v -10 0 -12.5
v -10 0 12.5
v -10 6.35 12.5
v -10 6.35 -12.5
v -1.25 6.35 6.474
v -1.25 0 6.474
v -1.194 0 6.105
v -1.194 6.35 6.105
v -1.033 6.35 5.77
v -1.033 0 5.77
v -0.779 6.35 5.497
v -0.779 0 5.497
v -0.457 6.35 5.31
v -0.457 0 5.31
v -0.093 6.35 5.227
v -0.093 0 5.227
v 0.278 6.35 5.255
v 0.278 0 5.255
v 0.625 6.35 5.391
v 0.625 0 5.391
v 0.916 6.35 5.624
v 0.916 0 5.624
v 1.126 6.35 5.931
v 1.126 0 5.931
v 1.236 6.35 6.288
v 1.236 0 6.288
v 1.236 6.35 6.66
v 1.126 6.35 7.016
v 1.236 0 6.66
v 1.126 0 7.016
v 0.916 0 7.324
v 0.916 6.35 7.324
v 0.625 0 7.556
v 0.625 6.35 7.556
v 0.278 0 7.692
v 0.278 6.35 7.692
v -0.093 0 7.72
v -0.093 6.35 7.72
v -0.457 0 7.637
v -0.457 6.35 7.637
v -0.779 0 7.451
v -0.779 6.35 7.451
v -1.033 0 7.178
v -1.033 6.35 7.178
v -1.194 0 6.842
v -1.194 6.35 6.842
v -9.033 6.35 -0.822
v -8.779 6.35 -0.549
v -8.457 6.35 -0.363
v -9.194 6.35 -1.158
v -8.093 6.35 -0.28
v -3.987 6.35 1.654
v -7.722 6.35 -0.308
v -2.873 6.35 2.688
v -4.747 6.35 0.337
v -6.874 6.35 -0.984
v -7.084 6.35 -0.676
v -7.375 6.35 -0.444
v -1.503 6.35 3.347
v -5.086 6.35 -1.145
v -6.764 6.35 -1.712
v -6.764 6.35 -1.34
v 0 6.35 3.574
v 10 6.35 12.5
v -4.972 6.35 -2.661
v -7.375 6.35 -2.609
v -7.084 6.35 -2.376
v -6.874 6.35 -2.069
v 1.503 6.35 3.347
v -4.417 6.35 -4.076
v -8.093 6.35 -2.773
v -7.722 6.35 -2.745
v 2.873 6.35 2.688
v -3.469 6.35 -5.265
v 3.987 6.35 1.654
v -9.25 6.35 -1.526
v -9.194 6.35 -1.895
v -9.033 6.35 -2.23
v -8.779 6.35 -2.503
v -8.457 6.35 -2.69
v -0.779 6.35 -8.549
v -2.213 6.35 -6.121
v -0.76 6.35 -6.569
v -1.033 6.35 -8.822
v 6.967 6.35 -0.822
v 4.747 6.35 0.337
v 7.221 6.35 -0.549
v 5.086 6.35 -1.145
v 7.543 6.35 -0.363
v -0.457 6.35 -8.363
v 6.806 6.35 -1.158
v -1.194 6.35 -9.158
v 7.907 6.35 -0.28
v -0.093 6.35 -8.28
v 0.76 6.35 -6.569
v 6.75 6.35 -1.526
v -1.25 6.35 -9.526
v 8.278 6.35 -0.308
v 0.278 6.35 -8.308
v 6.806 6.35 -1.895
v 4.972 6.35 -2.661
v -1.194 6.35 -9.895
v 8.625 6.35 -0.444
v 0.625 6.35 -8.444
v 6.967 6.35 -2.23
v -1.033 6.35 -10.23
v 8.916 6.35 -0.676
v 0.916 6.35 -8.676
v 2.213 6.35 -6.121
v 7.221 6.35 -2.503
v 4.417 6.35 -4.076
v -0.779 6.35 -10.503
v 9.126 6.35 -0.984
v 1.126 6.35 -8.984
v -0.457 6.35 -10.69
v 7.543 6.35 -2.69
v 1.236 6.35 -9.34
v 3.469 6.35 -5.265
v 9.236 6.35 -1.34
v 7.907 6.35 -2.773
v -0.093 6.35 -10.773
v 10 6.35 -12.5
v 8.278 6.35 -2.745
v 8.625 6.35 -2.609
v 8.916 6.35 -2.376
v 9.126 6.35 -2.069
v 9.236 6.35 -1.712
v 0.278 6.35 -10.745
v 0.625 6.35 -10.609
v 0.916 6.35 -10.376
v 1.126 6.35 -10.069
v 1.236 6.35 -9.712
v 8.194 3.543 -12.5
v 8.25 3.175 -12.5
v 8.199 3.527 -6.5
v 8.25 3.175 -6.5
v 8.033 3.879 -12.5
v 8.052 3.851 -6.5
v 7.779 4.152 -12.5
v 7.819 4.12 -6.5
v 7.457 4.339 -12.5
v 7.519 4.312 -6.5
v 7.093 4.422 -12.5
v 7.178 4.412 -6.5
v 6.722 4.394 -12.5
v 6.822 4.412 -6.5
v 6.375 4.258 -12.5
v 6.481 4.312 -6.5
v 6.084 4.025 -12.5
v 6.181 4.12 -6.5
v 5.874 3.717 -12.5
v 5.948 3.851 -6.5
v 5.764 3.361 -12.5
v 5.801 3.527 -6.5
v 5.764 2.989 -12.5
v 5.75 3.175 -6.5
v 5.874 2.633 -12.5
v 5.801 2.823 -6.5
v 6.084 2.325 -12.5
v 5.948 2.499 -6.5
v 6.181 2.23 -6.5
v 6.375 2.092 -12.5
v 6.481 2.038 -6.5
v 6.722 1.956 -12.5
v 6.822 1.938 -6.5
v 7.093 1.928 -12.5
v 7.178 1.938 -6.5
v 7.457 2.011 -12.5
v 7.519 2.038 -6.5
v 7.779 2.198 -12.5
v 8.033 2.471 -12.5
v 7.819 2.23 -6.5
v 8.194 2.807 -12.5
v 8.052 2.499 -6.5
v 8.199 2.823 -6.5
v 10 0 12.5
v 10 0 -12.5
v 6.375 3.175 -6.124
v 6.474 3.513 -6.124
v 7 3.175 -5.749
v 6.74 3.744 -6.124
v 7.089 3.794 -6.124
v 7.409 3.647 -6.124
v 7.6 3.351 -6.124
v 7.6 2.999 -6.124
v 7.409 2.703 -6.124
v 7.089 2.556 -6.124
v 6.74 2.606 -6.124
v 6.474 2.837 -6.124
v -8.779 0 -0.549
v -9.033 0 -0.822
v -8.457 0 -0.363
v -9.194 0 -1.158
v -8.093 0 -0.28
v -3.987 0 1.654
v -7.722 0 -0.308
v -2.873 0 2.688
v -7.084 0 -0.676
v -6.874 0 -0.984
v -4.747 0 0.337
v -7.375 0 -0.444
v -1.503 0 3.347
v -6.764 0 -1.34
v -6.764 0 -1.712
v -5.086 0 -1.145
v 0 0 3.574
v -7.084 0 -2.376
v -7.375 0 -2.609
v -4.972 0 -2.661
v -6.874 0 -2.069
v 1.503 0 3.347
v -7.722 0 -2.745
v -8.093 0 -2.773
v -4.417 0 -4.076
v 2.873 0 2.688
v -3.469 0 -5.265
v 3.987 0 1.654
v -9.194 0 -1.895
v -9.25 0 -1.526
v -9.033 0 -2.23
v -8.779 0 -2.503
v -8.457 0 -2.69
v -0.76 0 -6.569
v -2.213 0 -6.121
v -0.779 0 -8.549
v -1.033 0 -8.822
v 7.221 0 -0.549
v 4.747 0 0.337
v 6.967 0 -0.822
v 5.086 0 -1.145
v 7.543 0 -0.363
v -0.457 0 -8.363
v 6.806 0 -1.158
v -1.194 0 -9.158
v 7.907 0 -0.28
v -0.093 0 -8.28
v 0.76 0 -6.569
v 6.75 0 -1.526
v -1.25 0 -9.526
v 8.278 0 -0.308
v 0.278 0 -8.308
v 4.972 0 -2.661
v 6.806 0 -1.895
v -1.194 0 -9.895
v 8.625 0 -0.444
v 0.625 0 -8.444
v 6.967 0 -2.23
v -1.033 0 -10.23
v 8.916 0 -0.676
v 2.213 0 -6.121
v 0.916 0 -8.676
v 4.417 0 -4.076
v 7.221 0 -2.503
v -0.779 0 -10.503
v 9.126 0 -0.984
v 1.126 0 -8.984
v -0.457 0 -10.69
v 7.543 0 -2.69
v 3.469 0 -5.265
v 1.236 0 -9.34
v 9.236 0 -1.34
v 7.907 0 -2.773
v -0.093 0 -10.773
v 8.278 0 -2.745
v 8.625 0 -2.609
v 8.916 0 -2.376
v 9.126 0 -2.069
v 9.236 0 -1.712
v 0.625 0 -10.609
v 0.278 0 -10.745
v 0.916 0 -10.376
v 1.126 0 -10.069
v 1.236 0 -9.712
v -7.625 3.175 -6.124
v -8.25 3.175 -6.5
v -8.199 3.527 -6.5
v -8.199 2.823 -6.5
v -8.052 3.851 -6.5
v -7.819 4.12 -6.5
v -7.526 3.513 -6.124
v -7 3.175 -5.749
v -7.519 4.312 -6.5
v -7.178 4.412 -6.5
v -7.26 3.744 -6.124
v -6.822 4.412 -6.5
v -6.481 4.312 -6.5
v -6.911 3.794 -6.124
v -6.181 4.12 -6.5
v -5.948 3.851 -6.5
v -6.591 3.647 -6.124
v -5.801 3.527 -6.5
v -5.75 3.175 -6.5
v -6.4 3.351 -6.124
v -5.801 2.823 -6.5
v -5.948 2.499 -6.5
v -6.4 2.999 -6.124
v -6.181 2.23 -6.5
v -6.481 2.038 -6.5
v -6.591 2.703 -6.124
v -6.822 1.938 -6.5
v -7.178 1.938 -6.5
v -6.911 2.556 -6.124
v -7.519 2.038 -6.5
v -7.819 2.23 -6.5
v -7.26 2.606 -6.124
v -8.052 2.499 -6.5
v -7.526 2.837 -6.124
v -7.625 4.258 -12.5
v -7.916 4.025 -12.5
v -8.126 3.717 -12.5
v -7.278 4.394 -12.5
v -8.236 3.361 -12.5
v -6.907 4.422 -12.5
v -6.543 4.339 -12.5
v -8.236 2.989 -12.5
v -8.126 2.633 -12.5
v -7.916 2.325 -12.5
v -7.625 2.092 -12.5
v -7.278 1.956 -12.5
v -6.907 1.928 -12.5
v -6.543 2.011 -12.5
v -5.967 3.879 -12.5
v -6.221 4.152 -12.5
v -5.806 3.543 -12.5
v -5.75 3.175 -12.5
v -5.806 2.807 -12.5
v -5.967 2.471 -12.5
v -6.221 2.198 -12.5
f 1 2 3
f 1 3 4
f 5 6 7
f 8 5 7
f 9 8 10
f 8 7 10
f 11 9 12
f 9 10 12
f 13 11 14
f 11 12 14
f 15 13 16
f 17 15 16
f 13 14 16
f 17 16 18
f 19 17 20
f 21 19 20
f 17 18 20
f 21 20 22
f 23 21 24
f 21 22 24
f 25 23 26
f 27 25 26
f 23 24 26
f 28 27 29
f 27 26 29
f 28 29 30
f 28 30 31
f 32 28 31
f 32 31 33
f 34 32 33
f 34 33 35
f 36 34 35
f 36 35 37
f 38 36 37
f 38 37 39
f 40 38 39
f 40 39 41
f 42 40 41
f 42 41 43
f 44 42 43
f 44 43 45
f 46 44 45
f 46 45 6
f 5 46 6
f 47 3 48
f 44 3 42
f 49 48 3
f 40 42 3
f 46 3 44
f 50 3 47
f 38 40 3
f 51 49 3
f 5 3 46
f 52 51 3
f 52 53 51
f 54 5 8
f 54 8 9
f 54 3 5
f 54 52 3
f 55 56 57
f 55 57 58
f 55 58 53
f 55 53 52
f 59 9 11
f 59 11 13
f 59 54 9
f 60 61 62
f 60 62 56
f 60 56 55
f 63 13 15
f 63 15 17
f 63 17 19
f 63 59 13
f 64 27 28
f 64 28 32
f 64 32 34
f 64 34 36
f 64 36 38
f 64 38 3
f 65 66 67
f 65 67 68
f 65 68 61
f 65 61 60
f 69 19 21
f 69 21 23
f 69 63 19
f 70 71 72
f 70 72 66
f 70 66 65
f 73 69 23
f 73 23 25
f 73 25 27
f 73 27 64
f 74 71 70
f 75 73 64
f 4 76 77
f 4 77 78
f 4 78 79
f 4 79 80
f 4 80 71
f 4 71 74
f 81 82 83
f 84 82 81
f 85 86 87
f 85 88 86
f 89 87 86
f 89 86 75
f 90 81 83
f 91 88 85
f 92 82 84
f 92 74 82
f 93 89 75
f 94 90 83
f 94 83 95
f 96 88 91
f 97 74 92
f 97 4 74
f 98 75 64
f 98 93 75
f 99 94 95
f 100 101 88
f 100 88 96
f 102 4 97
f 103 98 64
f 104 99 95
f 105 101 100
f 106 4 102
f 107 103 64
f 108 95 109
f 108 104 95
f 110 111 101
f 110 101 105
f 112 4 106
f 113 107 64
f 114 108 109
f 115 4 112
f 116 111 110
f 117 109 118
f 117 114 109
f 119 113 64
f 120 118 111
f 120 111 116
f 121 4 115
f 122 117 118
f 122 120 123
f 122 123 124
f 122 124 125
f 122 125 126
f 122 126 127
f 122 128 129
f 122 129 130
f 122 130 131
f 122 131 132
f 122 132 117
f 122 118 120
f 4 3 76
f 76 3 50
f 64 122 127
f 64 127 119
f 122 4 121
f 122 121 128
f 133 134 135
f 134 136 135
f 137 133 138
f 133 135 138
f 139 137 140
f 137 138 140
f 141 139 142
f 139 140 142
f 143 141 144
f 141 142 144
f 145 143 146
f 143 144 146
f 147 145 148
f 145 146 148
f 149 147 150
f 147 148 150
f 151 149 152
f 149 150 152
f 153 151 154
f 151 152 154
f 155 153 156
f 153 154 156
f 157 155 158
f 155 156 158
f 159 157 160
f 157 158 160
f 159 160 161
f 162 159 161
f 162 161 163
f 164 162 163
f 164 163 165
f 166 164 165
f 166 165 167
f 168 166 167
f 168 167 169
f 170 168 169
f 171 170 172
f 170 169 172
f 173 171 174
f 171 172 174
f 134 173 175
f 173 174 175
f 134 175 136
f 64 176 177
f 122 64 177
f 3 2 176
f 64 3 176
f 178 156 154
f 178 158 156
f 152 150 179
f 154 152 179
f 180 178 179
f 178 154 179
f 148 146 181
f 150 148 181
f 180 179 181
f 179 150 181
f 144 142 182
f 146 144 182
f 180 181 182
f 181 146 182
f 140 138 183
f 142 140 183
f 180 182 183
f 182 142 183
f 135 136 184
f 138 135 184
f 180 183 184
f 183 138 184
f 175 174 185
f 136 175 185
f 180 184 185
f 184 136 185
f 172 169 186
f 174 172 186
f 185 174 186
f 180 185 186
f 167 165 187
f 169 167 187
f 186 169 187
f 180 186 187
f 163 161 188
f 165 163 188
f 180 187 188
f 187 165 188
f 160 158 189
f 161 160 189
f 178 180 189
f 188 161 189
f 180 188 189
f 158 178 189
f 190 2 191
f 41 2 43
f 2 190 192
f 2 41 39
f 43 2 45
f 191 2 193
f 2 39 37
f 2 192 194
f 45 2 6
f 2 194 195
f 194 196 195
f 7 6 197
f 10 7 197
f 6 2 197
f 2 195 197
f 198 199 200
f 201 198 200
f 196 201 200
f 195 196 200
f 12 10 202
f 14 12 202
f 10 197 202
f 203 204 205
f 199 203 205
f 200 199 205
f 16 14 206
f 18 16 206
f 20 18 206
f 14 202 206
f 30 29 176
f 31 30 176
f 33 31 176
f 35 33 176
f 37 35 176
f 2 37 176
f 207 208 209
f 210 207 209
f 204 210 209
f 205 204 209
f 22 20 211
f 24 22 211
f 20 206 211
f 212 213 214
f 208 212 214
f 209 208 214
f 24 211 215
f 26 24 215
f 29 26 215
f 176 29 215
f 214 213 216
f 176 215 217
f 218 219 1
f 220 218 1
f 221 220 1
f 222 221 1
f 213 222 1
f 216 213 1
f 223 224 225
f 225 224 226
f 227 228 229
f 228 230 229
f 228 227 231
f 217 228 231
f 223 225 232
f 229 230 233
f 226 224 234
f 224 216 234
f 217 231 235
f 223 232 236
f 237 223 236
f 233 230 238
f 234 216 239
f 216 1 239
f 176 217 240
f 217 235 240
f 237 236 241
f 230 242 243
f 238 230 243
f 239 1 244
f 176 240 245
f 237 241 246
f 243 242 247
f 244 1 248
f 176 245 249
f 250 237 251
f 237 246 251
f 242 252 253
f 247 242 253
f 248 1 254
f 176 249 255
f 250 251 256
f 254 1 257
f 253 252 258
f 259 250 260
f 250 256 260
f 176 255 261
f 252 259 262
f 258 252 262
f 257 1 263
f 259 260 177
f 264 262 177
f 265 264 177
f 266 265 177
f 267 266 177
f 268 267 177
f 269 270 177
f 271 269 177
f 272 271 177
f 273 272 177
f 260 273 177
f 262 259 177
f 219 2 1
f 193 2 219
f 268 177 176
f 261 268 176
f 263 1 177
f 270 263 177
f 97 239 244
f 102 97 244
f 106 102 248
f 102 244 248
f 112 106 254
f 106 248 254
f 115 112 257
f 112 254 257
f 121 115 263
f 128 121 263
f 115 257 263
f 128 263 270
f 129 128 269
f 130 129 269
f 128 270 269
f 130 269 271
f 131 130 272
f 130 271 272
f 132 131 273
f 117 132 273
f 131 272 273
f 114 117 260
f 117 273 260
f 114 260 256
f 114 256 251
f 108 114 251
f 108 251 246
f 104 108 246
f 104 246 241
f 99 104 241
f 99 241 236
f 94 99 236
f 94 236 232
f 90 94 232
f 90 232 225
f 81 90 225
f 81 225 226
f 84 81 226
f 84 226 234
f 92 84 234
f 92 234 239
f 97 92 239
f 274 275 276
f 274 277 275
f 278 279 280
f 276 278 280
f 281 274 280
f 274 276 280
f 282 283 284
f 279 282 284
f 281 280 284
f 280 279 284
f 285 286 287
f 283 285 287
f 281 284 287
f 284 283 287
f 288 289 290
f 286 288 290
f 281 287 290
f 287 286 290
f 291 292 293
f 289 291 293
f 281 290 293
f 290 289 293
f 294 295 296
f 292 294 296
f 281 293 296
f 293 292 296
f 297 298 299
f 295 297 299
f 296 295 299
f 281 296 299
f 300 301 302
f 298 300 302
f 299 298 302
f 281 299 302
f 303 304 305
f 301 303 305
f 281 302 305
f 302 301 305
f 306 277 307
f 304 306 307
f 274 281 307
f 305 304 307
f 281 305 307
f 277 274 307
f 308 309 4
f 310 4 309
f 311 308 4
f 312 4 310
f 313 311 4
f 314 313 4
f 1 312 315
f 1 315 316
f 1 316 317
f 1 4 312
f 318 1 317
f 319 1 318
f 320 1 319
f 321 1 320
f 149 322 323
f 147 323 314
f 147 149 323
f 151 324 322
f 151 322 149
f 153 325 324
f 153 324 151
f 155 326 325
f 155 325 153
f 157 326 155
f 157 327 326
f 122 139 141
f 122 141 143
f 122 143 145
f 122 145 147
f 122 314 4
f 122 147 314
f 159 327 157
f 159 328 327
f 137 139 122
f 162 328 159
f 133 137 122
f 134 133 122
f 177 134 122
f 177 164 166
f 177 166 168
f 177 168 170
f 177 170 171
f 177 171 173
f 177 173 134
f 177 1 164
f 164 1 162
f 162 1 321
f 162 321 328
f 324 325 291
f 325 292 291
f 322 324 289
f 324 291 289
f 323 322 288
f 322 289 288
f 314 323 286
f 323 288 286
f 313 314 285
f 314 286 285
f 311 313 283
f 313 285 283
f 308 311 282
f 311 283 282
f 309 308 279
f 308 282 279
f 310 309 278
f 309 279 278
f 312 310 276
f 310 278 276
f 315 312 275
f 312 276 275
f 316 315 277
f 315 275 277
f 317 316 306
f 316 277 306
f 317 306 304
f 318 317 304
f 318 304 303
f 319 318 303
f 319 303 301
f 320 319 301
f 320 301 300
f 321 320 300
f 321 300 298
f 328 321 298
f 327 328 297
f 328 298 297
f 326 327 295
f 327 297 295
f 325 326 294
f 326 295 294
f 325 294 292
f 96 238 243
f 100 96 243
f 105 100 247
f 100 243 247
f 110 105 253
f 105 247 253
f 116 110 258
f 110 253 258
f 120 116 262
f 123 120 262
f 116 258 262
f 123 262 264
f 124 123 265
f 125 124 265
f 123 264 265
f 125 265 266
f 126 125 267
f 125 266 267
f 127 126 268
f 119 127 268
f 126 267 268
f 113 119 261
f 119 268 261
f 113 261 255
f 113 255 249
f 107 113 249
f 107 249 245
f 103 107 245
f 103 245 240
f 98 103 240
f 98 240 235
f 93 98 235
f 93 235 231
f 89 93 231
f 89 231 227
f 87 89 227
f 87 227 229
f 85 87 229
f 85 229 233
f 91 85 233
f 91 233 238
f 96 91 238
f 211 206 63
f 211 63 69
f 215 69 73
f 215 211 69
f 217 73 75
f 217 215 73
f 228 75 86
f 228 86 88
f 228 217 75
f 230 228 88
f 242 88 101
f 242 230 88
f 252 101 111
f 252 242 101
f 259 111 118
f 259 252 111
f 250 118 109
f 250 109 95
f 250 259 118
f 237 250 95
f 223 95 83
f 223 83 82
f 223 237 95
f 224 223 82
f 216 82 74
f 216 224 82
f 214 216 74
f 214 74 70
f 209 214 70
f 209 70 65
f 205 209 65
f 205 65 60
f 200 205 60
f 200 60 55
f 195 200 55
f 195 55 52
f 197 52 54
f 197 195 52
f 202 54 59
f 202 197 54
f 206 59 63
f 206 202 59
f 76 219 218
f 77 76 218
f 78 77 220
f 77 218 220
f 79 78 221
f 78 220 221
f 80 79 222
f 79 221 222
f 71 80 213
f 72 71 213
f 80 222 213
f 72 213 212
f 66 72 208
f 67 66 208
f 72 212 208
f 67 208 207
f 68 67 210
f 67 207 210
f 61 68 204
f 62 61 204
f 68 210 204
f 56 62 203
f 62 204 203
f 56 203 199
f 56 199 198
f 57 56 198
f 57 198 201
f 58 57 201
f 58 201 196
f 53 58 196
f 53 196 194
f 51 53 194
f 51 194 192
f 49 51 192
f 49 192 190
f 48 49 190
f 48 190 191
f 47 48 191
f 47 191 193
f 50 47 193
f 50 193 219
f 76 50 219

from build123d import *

# Parameters (mm, degrees)
SKETCH1_W                       = 20
SKETCH1_H                       = 25
SKETCH1_R                       = 5.1
BOSS_EXTRUDE1_DEPTH             = 6.35
TAP_DRILL_FOR_M3X0_5_TAP1_D     = 2.5
TAP_DRILL_FOR_M3X0_5_TAP3_D     = 2.5
TAP_DRILL_FOR_M3X0_5_TAP3_DEPTH = 6
TAP_DRILL_FOR_M3X0_5_TAP3_TIP   = 0.751075774


with BuildPart() as part:
    # Sketch1 → Boss-Extrude1 (new body)
    with BuildSketch(Plane(origin=(0, 0, 0), x_dir=(1, 0, 0), z_dir=(0, 1, 0))):
        Rectangle(SKETCH1_W, SKETCH1_H)
        with Locations(Location((0, 1.5261946, 0), (0, 0, 270))):
            Circle(SKETCH1_R, mode=Mode.SUBTRACT)
    extrude(amount=BOSS_EXTRUDE1_DEPTH)

    # Tap Drill for M3x0.5 Tap1 (through all)
    with Locations(Plane(origin=(0, 6.35, 0), x_dir=(1, 0, 0), z_dir=(0, 1, 0))):
        with Locations((-8, 1.5261946), (0, 9.5261946), (8, 1.5261946), (0, -6.4738054)):
            Hole(TAP_DRILL_FOR_M3X0_5_TAP1_D / 2)

    # Tap Drill for M3x0.5 Tap3
    with Locations(Plane(origin=(0, 0, -12.5), x_dir=(-1, 0, 0), z_dir=(0, 0, -1))):
        with Locations((-7, 3.175), (7, 3.175)):
            Hole(TAP_DRILL_FOR_M3X0_5_TAP3_D / 2, depth=TAP_DRILL_FOR_M3X0_5_TAP3_DEPTH)
            with Locations((0, 0, -(TAP_DRILL_FOR_M3X0_5_TAP3_DEPTH + TAP_DRILL_FOR_M3X0_5_TAP3_TIP / 2))):  # 118° drill point
                Cone(0, TAP_DRILL_FOR_M3X0_5_TAP3_D / 2, TAP_DRILL_FOR_M3X0_5_TAP3_TIP, mode=Mode.SUBTRACT)


solid = part.part
